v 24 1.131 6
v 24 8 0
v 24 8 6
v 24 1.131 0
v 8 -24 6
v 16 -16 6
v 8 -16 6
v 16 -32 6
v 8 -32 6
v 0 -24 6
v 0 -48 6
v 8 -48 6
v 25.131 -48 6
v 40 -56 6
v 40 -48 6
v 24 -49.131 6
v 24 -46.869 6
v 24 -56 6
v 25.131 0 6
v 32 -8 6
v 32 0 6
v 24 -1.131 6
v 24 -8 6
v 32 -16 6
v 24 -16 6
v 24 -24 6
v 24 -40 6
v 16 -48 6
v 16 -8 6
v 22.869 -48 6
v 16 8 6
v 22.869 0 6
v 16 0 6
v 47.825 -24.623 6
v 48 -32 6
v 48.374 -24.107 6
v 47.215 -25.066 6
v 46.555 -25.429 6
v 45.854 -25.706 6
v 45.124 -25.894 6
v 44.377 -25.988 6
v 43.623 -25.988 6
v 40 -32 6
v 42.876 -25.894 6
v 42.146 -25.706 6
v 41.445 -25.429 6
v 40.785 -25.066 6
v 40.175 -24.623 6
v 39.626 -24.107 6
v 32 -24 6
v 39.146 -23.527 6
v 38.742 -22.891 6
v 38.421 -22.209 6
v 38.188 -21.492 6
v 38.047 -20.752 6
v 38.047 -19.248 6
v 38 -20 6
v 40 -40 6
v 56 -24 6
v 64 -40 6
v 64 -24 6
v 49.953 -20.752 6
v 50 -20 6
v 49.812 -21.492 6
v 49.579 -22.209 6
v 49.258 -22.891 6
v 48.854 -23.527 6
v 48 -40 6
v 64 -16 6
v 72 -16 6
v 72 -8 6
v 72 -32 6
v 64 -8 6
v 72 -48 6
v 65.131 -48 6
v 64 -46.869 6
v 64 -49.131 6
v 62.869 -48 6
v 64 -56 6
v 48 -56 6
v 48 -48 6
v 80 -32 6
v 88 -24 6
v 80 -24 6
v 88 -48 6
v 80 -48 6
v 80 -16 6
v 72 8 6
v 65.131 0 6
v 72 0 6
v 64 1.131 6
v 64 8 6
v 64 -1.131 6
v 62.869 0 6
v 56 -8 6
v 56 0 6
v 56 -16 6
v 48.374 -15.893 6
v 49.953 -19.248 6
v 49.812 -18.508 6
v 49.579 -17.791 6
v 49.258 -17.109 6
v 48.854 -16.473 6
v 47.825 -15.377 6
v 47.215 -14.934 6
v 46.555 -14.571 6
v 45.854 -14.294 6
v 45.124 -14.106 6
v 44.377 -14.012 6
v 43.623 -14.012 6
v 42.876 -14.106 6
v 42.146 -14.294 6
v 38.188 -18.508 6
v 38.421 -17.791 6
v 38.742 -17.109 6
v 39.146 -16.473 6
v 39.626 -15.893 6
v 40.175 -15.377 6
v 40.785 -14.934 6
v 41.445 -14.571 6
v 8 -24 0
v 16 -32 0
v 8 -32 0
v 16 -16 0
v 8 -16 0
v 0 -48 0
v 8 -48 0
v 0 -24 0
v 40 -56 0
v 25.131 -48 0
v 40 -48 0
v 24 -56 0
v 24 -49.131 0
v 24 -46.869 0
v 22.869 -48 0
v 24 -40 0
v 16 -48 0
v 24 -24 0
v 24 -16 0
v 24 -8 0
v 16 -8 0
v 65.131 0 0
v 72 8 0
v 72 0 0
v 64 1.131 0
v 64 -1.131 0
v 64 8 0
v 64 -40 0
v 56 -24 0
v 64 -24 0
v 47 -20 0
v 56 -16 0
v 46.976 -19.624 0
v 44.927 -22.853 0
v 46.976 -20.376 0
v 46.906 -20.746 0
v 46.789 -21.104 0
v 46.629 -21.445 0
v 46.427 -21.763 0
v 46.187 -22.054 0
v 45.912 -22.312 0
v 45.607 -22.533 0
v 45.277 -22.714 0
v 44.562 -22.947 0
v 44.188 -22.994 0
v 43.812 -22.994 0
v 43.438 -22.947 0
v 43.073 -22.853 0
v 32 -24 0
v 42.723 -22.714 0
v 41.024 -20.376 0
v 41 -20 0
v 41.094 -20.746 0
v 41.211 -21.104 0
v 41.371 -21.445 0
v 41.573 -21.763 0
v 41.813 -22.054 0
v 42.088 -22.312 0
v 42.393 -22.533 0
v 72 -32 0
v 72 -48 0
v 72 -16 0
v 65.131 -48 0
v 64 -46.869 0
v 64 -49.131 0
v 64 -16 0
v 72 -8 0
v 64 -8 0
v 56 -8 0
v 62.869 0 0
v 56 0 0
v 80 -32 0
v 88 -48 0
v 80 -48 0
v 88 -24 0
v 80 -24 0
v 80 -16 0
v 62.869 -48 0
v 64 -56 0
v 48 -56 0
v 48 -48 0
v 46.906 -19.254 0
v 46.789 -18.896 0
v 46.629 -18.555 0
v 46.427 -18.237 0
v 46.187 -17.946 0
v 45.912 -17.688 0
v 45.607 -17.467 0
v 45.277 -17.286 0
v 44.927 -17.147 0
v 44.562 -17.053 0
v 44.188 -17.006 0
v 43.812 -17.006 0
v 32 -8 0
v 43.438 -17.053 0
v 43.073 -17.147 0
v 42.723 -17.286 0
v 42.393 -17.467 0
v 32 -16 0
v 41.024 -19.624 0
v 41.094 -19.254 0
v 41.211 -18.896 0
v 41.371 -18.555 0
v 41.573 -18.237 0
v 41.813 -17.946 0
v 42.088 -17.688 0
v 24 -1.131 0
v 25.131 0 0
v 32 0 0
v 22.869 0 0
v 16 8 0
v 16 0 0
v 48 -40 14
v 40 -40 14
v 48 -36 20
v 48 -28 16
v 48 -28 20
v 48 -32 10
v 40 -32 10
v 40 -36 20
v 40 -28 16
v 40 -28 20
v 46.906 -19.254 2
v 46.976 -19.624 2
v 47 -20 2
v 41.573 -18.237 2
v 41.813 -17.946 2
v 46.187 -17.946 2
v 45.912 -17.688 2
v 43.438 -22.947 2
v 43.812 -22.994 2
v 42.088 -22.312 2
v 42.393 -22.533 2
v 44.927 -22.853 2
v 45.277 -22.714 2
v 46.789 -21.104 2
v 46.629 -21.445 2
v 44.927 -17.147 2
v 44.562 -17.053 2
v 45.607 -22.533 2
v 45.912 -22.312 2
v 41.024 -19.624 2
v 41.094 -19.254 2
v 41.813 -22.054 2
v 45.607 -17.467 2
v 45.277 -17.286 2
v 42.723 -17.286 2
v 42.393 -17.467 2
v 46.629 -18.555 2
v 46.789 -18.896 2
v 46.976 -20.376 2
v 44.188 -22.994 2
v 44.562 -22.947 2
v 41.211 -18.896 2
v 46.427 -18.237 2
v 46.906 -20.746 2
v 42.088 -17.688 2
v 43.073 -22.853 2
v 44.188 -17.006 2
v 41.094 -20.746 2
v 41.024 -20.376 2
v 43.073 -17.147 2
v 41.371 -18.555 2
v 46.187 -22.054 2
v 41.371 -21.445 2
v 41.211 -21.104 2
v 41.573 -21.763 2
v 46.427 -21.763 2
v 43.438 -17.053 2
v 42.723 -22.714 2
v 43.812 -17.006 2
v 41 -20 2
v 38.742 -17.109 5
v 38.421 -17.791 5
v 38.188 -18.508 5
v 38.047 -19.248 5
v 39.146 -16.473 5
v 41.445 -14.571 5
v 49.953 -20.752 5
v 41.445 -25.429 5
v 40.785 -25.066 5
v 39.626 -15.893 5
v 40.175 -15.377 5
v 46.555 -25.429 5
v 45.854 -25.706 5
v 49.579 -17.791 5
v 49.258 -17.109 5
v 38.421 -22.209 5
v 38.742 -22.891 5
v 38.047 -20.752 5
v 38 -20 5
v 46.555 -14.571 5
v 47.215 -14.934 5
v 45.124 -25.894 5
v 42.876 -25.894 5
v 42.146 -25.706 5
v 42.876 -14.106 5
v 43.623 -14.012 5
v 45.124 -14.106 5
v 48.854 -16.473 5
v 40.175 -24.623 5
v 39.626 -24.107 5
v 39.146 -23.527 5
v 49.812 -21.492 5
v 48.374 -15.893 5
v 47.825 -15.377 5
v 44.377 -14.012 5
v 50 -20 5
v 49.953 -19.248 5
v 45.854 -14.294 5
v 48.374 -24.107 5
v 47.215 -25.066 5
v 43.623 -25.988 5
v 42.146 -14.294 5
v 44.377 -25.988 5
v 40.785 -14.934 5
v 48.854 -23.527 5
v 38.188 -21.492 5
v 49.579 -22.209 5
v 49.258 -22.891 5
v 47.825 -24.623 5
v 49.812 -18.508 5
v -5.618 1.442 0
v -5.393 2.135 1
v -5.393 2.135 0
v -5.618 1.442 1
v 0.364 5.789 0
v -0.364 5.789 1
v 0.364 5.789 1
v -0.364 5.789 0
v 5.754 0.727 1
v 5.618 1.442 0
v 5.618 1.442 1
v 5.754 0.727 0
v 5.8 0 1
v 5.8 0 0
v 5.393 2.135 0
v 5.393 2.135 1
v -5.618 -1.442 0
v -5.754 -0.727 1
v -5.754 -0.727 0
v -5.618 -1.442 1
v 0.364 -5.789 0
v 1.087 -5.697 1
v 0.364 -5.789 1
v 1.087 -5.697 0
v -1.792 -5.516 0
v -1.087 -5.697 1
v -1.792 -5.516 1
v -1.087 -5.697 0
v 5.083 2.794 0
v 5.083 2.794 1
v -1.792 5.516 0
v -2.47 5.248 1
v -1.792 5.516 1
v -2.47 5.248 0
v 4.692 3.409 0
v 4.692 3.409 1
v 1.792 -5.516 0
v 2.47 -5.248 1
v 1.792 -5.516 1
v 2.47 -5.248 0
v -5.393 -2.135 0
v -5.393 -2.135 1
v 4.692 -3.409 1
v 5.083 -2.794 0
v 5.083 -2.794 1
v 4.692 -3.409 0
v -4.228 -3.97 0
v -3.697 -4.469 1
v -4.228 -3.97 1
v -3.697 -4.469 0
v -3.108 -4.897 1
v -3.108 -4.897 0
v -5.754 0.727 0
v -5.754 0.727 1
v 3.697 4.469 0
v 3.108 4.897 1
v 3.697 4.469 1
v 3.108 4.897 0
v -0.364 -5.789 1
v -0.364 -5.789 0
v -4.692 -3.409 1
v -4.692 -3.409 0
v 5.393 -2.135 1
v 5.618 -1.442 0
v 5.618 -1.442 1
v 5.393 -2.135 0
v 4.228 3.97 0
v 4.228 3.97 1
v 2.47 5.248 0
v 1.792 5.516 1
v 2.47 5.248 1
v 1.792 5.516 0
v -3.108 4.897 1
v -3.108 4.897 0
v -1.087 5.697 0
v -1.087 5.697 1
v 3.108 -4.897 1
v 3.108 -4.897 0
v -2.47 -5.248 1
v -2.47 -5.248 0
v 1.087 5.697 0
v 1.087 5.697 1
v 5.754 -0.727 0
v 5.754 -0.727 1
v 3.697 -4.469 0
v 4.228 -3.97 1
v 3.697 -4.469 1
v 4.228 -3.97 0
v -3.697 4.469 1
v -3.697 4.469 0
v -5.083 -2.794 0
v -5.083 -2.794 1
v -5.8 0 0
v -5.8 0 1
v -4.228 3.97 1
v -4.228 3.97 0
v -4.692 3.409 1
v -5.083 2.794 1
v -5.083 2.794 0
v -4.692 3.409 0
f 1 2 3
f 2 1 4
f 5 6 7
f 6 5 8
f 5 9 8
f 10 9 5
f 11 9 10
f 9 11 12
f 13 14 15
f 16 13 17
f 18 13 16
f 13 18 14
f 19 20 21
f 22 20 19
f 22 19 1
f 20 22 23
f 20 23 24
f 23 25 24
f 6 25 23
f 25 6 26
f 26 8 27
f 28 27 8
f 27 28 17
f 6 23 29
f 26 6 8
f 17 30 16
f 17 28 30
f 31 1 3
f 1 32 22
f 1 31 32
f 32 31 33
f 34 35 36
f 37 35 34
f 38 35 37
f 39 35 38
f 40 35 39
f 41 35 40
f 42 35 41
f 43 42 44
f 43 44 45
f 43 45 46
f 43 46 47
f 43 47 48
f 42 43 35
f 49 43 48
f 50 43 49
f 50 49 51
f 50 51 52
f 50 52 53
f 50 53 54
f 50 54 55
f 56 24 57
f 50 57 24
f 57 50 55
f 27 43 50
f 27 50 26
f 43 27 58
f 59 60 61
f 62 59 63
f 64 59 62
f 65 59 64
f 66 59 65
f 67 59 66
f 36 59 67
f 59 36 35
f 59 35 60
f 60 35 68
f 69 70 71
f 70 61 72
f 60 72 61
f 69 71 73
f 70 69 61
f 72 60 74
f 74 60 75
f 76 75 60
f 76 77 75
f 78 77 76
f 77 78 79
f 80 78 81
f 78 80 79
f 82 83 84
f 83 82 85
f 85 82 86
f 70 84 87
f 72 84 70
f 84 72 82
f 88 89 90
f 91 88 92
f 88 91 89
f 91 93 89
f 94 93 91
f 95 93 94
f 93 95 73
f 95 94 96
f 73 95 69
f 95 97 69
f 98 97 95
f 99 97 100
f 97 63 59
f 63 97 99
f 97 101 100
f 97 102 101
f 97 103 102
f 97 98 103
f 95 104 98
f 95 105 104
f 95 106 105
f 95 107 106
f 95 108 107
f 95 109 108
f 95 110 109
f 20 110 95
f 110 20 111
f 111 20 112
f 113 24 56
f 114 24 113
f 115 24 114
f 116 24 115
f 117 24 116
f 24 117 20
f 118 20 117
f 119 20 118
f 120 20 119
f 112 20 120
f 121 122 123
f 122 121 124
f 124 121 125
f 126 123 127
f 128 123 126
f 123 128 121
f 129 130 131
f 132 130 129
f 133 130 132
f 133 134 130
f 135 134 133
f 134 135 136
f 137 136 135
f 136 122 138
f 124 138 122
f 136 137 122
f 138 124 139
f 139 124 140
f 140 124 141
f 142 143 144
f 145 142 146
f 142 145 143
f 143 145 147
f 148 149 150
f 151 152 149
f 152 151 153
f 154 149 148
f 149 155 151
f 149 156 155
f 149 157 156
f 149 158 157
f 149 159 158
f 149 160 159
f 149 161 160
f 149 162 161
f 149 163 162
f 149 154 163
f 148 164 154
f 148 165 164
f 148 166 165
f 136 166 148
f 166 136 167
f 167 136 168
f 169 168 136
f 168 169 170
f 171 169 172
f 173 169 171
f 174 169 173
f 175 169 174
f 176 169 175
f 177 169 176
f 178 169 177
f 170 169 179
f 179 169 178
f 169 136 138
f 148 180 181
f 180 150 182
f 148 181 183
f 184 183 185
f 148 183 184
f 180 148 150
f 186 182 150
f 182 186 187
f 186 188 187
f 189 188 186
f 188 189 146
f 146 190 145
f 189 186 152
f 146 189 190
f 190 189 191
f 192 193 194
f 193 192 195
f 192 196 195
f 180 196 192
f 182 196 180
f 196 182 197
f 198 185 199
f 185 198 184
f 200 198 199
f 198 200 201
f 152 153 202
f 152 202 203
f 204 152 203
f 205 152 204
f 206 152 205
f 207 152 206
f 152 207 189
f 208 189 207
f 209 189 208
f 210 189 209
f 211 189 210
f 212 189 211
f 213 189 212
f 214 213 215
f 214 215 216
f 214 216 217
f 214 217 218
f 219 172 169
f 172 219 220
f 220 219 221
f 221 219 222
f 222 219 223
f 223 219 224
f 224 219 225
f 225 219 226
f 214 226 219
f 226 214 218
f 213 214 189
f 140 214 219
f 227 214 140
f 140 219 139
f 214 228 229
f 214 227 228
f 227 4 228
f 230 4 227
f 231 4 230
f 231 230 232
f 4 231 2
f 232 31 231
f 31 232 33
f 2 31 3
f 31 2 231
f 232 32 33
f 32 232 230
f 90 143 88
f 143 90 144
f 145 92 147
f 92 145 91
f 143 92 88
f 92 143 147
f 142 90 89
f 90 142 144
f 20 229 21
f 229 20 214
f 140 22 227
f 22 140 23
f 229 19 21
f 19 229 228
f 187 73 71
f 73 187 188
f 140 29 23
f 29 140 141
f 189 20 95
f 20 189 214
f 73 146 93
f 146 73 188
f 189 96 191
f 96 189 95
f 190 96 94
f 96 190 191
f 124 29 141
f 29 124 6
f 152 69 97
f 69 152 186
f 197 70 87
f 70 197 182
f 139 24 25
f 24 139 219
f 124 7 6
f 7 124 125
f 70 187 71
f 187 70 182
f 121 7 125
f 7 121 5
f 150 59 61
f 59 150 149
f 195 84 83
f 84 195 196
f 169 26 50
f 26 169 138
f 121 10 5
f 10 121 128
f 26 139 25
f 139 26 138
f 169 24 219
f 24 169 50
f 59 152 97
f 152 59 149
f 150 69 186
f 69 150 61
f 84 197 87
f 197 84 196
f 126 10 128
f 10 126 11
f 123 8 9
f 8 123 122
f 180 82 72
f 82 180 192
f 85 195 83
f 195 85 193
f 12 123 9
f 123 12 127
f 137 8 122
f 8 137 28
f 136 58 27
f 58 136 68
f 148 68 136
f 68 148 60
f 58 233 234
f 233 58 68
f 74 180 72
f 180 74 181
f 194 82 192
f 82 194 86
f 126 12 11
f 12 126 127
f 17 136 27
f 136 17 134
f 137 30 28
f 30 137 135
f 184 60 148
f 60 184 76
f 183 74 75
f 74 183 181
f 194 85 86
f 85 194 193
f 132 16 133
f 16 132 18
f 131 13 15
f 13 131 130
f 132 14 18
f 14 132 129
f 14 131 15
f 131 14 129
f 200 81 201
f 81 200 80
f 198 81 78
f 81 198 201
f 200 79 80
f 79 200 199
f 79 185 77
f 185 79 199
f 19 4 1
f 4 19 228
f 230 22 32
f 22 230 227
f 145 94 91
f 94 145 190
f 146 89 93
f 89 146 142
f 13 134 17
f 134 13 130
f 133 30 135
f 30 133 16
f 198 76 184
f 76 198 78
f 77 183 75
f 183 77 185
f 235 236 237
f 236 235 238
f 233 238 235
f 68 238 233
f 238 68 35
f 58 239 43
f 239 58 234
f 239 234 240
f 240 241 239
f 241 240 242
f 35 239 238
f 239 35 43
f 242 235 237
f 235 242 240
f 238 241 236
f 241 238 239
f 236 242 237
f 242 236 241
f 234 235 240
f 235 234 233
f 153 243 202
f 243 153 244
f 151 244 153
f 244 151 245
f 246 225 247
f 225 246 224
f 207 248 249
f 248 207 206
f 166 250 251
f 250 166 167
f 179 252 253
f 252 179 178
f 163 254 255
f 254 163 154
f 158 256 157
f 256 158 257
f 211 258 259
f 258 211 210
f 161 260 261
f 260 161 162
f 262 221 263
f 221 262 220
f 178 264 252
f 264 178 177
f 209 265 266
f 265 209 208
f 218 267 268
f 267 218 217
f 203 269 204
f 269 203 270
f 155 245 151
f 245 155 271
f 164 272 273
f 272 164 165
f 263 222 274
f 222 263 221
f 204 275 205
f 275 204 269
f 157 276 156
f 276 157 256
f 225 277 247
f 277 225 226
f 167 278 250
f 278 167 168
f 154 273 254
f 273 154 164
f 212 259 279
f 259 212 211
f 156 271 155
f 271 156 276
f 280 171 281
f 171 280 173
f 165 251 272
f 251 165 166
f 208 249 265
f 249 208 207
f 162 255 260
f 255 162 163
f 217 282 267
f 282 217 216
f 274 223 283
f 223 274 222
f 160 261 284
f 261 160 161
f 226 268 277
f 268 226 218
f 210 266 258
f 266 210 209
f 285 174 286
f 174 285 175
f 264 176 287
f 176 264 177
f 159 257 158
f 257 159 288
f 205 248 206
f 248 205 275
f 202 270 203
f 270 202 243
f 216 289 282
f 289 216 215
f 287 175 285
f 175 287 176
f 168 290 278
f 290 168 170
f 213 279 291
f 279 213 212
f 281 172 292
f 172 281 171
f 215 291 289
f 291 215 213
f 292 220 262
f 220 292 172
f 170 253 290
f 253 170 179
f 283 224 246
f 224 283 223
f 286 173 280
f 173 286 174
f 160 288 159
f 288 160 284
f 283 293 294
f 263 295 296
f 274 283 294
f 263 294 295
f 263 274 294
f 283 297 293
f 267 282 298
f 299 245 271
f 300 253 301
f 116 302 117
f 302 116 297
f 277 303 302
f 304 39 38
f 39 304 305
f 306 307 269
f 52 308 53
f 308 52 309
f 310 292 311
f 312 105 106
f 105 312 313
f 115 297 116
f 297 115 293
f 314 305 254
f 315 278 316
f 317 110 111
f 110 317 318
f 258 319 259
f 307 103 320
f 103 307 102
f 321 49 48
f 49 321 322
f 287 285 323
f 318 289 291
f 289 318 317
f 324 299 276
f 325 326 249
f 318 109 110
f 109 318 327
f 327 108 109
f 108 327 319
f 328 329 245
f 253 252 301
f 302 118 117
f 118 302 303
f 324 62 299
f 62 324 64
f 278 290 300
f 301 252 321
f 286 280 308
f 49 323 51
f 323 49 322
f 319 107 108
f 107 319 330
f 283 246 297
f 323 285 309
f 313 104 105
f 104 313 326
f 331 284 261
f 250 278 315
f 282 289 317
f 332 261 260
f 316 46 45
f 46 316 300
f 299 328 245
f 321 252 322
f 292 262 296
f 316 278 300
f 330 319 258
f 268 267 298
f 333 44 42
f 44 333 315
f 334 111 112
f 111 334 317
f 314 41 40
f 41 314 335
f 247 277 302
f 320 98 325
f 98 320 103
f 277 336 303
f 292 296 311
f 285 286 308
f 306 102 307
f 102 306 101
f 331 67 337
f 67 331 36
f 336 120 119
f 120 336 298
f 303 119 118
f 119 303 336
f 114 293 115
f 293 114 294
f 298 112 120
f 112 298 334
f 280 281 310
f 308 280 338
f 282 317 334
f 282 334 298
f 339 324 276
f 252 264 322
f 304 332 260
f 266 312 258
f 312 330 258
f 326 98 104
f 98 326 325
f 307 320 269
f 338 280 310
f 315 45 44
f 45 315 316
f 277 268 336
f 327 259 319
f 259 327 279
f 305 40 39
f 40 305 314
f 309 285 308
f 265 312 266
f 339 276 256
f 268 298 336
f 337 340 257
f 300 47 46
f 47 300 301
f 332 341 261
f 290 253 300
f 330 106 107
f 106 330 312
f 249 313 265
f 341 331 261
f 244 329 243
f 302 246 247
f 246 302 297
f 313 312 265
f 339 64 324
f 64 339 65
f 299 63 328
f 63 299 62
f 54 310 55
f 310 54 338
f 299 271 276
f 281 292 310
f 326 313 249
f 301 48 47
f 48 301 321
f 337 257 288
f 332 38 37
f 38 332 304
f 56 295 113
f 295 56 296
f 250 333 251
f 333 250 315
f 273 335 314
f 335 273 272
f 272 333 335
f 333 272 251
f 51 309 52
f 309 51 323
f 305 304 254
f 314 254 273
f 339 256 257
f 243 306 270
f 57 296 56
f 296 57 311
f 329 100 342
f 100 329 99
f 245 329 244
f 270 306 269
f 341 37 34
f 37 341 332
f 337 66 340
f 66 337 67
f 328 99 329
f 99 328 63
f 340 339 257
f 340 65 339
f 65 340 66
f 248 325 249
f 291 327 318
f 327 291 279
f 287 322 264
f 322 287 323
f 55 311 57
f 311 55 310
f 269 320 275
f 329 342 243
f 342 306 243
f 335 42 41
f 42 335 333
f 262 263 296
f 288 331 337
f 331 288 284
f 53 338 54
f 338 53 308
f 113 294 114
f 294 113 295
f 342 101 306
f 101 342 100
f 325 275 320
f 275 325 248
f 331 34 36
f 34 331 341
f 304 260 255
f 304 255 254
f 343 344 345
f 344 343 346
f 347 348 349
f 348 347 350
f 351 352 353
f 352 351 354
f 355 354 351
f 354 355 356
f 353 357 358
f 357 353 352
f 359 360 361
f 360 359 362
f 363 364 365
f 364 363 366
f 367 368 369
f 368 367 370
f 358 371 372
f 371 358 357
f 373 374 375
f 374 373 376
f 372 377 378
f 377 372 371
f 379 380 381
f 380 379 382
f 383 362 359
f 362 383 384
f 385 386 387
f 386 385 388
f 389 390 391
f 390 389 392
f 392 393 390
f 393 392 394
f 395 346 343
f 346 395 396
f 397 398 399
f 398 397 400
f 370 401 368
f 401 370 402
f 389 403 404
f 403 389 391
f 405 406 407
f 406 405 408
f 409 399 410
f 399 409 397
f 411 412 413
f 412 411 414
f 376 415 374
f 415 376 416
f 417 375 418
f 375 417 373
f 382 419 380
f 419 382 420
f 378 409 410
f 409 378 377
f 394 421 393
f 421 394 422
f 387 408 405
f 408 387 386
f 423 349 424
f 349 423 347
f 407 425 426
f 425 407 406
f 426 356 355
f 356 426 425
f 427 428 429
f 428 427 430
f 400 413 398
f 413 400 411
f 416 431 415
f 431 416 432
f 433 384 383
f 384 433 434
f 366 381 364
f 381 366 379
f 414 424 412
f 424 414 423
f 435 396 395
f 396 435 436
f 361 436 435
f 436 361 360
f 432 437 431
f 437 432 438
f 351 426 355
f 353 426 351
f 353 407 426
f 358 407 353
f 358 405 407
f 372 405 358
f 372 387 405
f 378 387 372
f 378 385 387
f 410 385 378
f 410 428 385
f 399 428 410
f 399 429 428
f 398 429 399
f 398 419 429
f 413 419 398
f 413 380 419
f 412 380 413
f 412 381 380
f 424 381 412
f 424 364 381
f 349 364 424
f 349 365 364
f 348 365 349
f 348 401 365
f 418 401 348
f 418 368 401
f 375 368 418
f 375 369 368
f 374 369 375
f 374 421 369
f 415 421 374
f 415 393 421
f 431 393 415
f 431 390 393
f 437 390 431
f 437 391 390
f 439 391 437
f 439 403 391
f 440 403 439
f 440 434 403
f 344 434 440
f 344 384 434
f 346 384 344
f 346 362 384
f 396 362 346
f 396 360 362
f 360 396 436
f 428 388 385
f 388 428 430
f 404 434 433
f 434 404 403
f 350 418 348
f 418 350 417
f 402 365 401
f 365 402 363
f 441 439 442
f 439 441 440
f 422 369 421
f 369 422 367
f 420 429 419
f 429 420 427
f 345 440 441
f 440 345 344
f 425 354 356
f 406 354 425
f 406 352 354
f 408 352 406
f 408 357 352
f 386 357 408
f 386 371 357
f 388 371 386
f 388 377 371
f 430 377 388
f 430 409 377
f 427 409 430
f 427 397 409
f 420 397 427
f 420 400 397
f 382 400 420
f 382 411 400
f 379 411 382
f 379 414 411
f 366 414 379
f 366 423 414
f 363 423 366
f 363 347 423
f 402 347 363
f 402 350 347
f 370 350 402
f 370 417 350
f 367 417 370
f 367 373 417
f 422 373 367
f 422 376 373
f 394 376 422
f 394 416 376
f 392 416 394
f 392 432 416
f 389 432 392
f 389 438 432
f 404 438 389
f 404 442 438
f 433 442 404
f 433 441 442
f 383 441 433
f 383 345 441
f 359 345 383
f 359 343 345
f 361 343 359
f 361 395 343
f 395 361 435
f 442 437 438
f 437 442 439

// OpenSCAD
/* ********************************************************************
 * Space Invader Hooks
 * 
 * Generate your own cloth hooks. Tweak parameters, create your own
 * hooks or use the predefined modules.
 *
 * ******************************************************************** */
/* changes by Cuanu:
- adopted countersink for metric coungtersink (45° slope)
- indented screw hole by 1mm to be able to put a cap on
- generate a cap for the screw hole
- made the pixel_connection_strength derived from the pixel size

*/
// preview[view:south, tilt:top]

// ------------------------------------------------------------------
// --- parameter ----------------------------------------------------
// ------------------------------------------------------------------

/* [Global] */



/* [Basic] */

// choose a space invader
spaceInvader = 6; // [1,2,3,4,5,6,7,8,9,10]

// pixel size
edgeLength = 8;

// thickness of the hook
strength = 6;

// radius of the hole
holeRadius = 3.0;

// adjust the strength of the connections of otherwise unconnected pixel
pixel_connection_strength = edgeLength/10;


/* [Advanced] */

// resolution
$fn=50;

// make a hole or not
make_hole = "yes"; // [yes,no]

// make a hook or just the base space invader
make_hook = "yes"; // [yes,no]

// use to avoid loonely pixel
 minkowski_factor=10;

translate([0,0,0])cylinder(r=2*holeRadius-0.2,h=1);

/* [Hidden] */

// ------------------------------------------------------------------
// --- space invader versions ---------------------------------------
// --- a vector of 2d coordinates; hole and hook position -----------
// ------------------------------------------------------------------

// space invader 1 parameter
si_1=[[0,0,1,0,1,0,0],[0,1,1,1,1,1,0],[0,1,0,1,0,1,0],[1,1,1,1,1,1,1],[1,0,1,0,1,0,1],[1,0,0,0,0,0,1]];
si_1_hole=[3,2];
si_1_hook=[3,4];

// space invader 2 parameter
si_2=[[0,0,1,0,1,0,0],[0,1,1,1,1,1,0],[0,1,0,1,0,1,0],[1,1,1,1,1,1,1],[1,0,1,1,1,0,1],[1,0,0,1,0,0,1]];
si_2_hole=[3,3];
si_2_hook=[3,5];

// space invader 3 parameter
si_3=[[0,0,1,0,1,0,0],[0,1,1,1,1,1,0],[0,1,0,1,0,1,0],[1,1,1,1,1,1,1],[1,0,1,1,1,0,1],[1,0,0,1,0,0,1],[0,0,0,1,0,0,0]];
si_3_hole=[3,3];
si_3_hook=[3,6];

// space invader 5 parameter
si_4=[[0,0,1,0,1,0,0],[0,1,1,1,1,1,0],[0,1,0,1,0,1,0],[1,1,1,1,1,1,1],[1,0,1,1,1,0,1],[1,0,0,1,0,0,1],[1,1,0,1,0,1,1]];
si_4_hole=[3,3];
si_4_hook=[3,6];

// space invader 5 parameter
si_5=[[0,0,1,1,0,1,1,0,0],[0,1,1,1,1,1,1,1,0],[0,1,0,0,1,0,0,1,0],[1,1,0,0,1,0,0,1,1],[1,1,1,1,1,1,1,1,1],[0,0,1,1,1,1,1,0,0],[0,1,1,0,1,0,1,1,0],[1,1,0,0,0,0,0,1,1]];
si_5_hole=[4,4];
si_5_hook=[4,6];

// space invader 6 parameter
si_6=[[0,0,1,0,0,0,0,0,1,0,0],[0,0,0,1,0,0,0,1,0,0,0],[0,0,1,1,1,1,1,1,1,0,0],[0,1,1,0,1,1,1,0,1,1,0],[1,1,1,1,1,1,1,1,1,1,1],[1,0,1,1,1,1,1,1,1,0,1],[1,0,1,0,0,0,0,0,1,0,1],[0,0,0,1,1,0,1,1,0,0,0]];
si_6_hole=[5,3];
si_6_hook=[5,5];
si_6_cons=[[0,0,2,0,0,0,0,0,0,0,0],[0,0,0,0,0,0,0,1,0,0,0],[0,0,0,0,0,0,0,0,0,0,0],[0,0,0,0,0,0,0,0,0,0,0],[0,0,0,0,0,0,0,0,0,0,0],[0,0,0,0,0,0,0,0,0,0,0],[0,0,2,0,0,0,0,0,0,0,0],[0,0,0,0,0,0,0,1,0,0,0]];

// space invader 7 parameter
si_7=[[0,0,0,1,1,0,0,0],[0,0,1,1,1,1,0,0],[0,1,1,1,1,1,1,0],[1,1,0,1,1,0,1,1],[1,1,1,1,1,1,1,1],[0,1,0,1,1,0,1,0],[1,0,0,0,0,0,0,1],[0,1,0,0,0,0,1,0]];
si_7_hole=[3.5,3];
si_7_hook=[3.5,5];
si_7_cons=[[0,0,0,0,0,0,0,0],[0,0,0,0,0,0,0,0],[0,0,0,0,0,0,0,0],[0,0,0,0,0,0,0,0],[0,0,0,0,0,0,0,0],[0,0,0,0,0,0,2,0],[3,0,0,0,0,0,0,0],[0,0,0,0,0,0,1,0]];

// space invader 8 parameter
si_8=[[0,0,0,1,1,0,0,0],[0,0,1,1,1,1,0,0],[0,1,1,1,1,1,1,0],[1,1,0,1,1,0,1,1],[1,1,1,1,1,1,1,1],[0,1,0,1,1,0,1,0],[1,0,1,0,0,1,0,1],[0,1,0,1,1,0,1,0]];
si_8_hole=[3.5,3];
si_8_hook=[3.5,5];
si_8_cons=[[0,0,0,0,0,0,0,0],[0,0,0,0,0,0,0,0],[0,0,0,0,0,0,0,0],[0,0,0,0,0,0,0,0],[0,0,0,0,0,0,0,0],[0,2,0,0,2,0,2,0],[3,0,3,0,0,3,0,0],[0,1,0,0,1,0,1,0]];

// space invader 9 parameter
si_9=[[0,0,0,0,1,1,1,1,0,0,0,0],[0,1,1,1,1,1,1,1,1,1,1,0],[1,1,1,1,1,1,1,1,1,1,1,1],[1,1,1,0,0,1,1,0,0,1,1,1],[1,1,1,1,1,1,1,1,1,1,1,1],[0,0,1,1,1,0,0,1,1,1,0,0],[0,1,1,0,0,1,1,0,0,1,1,0],[0,0,1,1,0,0,0,0,1,1,0,0]];
si_9_hole=[5.5,2];
si_9_hook=[5.5,4];
si_9_cons=[[0,0,0,0,0,0,0,0,0,0,0,0],[0,0,0,0,0,0,0,0,0,0,0,0],[0,0,0,0,0,0,0,0,0,0,0,0],[0,0,0,0,0,0,0,0,0,0,0,0],[0,0,0,0,0,0,0,0,0,0,0,0],[0,0,0,0,2,0,0,0,0,0,0,0],[0,0,0,0,0,0,1,0,0,0,0,0],[0,0,0,0,0,0,0,0,0,0,0,0]];

si_10=[[0,0,0,0,0,1,1,1,1,1,1,0,0,0,0,0],[0,0,0,1,1,1,1,1,1,1,1,1,1,0,0,0],[0,0,1,1,1,1,1,1,1,1,1,1,1,1,0,0],[0,1,1,0,1,1,0,1,1,0,1,1,0,1,1,0],[1,1,1,1,1,1,1,1,1,1,1,1,1,1,1,1],[0,0,1,1,1,0,0,1,1,0,0,1,1,1,0,0],[0,0,0,1,0,0,0,0,0,0,0,0,1,0,0,0]];
si_10_hole=[7.5,3];
si_10_hook=[7.5,5];
si_10_cons=[];




// ------------------------------------------------------------------
// --- programm -----------------------------------------------------
// ------------------------------------------------------------------

if (spaceInvader == 1) {
	complete_hook(si_1, [], si_1_hole, si_1_hook);
} else if (spaceInvader == 2) {
	complete_hook(si_2, [], si_2_hole, si_2_hook);
} else if (spaceInvader == 3) {
	complete_hook(si_3, [], si_3_hole, si_3_hook);
} else if (spaceInvader == 4) {
	complete_hook(si_4, [], si_4_hole, si_4_hook);
} else if (spaceInvader == 5) {
	complete_hook(si_5, [], si_5_hole, si_5_hook);
} else if (spaceInvader == 6) {
	complete_hook(si_6, si_6_cons, si_6_hole, si_6_hook);
} else if (spaceInvader == 7) {
	complete_hook(si_7, si_7_cons, si_7_hole, si_7_hook);
} else if (spaceInvader == 8) {
	complete_hook(si_8, si_8_cons, si_8_hole, si_8_hook);
} else if (spaceInvader == 9) {
	complete_hook(si_9, si_9_cons, si_9_hole, si_9_hook);
} else if (spaceInvader == 10) {
	complete_hook(si_10, si_10_cons, si_10_hole, si_10_hook);
}




// ------------------------------------------------------------------
// --- modules ------------------------------------------------------
// ------------------------------------------------------------------



module complete_hook(matrix, cons, hole, hook) {
	difference() {
		union() {
			hook_base(matrix);
			connections(cons);
			if (make_hook == "yes") {
				hook(hook[0], hook[1]);
			}
		}
		if (make_hole == "yes") {
			hook_hole_positive(hole[0], hole[1], 1);
		}
	}
}


module hook_base(data) {
	for (y = [0:len(data)]) {
		for(x = [0:len(data[y])]) {
			pixel(x,y,data[y][x]);
		}
	}
}

module connections(data) {
	for (y = [0:len(data)]) {
		for(x = [0:len(data[y])]) {
			if (data[y][x] > 0) {
				pixel_connection(x,y,data[y][x]);
			}
		}
	}
}

// builds a cube at specified position
//
module pixel(x, y, h) {
	translate([x*edgeLength, -y*edgeLength, 0]) {
		if (h > 0) {
			cube([edgeLength, edgeLength, strength*h]);
			/*
			minkowski()
			{
				cube([edgeLength, edgeLength, strength*h-(strength/5)]);
 				cylinder(r=strength/10,h=strength*h-(strength/5));
			}
			*/
		}
	}
}

// build a connection
module pixel_connection(x,y,direction) {
	translate([(x+0.5)*edgeLength,-(y-0.5)*edgeLength,0]) {
		if (direction == 3) {
			union() {
				hull() {
					cylinder(r=pixel_connection_strength, h=strength);
					translate([edgeLength,edgeLength,0]) {
						cylinder(r=pixel_connection_strength, h=strength);
					}
				}
				hull() {
					cylinder(r=pixel_connection_strength, h=strength);
					translate([edgeLength,-edgeLength,0]) {
						cylinder(r=pixel_connection_strength, h=strength);
					}
				}
			}
		}
		hull() {
			cylinder(r=pixel_connection_strength, h=strength);
			if (direction == 1) {
				translate([edgeLength,edgeLength,0]) {
					cylinder(r=pixel_connection_strength, h=strength);
				}
			}
			if (direction == 2) {
				translate([edgeLength,-edgeLength,0]) {
					cylinder(r=pixel_connection_strength, h=strength);
				}
			}
		}
	}
}

// make the positives for the holes
//
module hook_hole_positive(x,y,h) {
	translate([x*edgeLength+edgeLength/2, -y*edgeLength+edgeLength/2, 0]) {
		cylinder(h=strength*h, r=holeRadius);
		hull() {
			translate([0, 0, strength*h-holeRadius-1]) cylinder(h=0.1, r=holeRadius);
			translate([0, 0, strength-1]) cylinder(h=1, r=holeRadius*2);
		}
	}
}

// builds the hook at specified position
//
module hook(x, y) {
	translate([x*edgeLength, -y*edgeLength, 0]) {
		union() {
			cube([edgeLength, edgeLength, 0.5*edgeLength+strength]);
			hull() {
				translate([0, 0, 0.5*edgeLength+strength]) {
					cube([edgeLength, edgeLength, 0.5*edgeLength]);
				}
				translate([0, 0.5*edgeLength, 0.5*edgeLength+2*strength]) {
					cube([edgeLength, edgeLength, 0.5*edgeLength]);
				}
			}
		}
	}
}
